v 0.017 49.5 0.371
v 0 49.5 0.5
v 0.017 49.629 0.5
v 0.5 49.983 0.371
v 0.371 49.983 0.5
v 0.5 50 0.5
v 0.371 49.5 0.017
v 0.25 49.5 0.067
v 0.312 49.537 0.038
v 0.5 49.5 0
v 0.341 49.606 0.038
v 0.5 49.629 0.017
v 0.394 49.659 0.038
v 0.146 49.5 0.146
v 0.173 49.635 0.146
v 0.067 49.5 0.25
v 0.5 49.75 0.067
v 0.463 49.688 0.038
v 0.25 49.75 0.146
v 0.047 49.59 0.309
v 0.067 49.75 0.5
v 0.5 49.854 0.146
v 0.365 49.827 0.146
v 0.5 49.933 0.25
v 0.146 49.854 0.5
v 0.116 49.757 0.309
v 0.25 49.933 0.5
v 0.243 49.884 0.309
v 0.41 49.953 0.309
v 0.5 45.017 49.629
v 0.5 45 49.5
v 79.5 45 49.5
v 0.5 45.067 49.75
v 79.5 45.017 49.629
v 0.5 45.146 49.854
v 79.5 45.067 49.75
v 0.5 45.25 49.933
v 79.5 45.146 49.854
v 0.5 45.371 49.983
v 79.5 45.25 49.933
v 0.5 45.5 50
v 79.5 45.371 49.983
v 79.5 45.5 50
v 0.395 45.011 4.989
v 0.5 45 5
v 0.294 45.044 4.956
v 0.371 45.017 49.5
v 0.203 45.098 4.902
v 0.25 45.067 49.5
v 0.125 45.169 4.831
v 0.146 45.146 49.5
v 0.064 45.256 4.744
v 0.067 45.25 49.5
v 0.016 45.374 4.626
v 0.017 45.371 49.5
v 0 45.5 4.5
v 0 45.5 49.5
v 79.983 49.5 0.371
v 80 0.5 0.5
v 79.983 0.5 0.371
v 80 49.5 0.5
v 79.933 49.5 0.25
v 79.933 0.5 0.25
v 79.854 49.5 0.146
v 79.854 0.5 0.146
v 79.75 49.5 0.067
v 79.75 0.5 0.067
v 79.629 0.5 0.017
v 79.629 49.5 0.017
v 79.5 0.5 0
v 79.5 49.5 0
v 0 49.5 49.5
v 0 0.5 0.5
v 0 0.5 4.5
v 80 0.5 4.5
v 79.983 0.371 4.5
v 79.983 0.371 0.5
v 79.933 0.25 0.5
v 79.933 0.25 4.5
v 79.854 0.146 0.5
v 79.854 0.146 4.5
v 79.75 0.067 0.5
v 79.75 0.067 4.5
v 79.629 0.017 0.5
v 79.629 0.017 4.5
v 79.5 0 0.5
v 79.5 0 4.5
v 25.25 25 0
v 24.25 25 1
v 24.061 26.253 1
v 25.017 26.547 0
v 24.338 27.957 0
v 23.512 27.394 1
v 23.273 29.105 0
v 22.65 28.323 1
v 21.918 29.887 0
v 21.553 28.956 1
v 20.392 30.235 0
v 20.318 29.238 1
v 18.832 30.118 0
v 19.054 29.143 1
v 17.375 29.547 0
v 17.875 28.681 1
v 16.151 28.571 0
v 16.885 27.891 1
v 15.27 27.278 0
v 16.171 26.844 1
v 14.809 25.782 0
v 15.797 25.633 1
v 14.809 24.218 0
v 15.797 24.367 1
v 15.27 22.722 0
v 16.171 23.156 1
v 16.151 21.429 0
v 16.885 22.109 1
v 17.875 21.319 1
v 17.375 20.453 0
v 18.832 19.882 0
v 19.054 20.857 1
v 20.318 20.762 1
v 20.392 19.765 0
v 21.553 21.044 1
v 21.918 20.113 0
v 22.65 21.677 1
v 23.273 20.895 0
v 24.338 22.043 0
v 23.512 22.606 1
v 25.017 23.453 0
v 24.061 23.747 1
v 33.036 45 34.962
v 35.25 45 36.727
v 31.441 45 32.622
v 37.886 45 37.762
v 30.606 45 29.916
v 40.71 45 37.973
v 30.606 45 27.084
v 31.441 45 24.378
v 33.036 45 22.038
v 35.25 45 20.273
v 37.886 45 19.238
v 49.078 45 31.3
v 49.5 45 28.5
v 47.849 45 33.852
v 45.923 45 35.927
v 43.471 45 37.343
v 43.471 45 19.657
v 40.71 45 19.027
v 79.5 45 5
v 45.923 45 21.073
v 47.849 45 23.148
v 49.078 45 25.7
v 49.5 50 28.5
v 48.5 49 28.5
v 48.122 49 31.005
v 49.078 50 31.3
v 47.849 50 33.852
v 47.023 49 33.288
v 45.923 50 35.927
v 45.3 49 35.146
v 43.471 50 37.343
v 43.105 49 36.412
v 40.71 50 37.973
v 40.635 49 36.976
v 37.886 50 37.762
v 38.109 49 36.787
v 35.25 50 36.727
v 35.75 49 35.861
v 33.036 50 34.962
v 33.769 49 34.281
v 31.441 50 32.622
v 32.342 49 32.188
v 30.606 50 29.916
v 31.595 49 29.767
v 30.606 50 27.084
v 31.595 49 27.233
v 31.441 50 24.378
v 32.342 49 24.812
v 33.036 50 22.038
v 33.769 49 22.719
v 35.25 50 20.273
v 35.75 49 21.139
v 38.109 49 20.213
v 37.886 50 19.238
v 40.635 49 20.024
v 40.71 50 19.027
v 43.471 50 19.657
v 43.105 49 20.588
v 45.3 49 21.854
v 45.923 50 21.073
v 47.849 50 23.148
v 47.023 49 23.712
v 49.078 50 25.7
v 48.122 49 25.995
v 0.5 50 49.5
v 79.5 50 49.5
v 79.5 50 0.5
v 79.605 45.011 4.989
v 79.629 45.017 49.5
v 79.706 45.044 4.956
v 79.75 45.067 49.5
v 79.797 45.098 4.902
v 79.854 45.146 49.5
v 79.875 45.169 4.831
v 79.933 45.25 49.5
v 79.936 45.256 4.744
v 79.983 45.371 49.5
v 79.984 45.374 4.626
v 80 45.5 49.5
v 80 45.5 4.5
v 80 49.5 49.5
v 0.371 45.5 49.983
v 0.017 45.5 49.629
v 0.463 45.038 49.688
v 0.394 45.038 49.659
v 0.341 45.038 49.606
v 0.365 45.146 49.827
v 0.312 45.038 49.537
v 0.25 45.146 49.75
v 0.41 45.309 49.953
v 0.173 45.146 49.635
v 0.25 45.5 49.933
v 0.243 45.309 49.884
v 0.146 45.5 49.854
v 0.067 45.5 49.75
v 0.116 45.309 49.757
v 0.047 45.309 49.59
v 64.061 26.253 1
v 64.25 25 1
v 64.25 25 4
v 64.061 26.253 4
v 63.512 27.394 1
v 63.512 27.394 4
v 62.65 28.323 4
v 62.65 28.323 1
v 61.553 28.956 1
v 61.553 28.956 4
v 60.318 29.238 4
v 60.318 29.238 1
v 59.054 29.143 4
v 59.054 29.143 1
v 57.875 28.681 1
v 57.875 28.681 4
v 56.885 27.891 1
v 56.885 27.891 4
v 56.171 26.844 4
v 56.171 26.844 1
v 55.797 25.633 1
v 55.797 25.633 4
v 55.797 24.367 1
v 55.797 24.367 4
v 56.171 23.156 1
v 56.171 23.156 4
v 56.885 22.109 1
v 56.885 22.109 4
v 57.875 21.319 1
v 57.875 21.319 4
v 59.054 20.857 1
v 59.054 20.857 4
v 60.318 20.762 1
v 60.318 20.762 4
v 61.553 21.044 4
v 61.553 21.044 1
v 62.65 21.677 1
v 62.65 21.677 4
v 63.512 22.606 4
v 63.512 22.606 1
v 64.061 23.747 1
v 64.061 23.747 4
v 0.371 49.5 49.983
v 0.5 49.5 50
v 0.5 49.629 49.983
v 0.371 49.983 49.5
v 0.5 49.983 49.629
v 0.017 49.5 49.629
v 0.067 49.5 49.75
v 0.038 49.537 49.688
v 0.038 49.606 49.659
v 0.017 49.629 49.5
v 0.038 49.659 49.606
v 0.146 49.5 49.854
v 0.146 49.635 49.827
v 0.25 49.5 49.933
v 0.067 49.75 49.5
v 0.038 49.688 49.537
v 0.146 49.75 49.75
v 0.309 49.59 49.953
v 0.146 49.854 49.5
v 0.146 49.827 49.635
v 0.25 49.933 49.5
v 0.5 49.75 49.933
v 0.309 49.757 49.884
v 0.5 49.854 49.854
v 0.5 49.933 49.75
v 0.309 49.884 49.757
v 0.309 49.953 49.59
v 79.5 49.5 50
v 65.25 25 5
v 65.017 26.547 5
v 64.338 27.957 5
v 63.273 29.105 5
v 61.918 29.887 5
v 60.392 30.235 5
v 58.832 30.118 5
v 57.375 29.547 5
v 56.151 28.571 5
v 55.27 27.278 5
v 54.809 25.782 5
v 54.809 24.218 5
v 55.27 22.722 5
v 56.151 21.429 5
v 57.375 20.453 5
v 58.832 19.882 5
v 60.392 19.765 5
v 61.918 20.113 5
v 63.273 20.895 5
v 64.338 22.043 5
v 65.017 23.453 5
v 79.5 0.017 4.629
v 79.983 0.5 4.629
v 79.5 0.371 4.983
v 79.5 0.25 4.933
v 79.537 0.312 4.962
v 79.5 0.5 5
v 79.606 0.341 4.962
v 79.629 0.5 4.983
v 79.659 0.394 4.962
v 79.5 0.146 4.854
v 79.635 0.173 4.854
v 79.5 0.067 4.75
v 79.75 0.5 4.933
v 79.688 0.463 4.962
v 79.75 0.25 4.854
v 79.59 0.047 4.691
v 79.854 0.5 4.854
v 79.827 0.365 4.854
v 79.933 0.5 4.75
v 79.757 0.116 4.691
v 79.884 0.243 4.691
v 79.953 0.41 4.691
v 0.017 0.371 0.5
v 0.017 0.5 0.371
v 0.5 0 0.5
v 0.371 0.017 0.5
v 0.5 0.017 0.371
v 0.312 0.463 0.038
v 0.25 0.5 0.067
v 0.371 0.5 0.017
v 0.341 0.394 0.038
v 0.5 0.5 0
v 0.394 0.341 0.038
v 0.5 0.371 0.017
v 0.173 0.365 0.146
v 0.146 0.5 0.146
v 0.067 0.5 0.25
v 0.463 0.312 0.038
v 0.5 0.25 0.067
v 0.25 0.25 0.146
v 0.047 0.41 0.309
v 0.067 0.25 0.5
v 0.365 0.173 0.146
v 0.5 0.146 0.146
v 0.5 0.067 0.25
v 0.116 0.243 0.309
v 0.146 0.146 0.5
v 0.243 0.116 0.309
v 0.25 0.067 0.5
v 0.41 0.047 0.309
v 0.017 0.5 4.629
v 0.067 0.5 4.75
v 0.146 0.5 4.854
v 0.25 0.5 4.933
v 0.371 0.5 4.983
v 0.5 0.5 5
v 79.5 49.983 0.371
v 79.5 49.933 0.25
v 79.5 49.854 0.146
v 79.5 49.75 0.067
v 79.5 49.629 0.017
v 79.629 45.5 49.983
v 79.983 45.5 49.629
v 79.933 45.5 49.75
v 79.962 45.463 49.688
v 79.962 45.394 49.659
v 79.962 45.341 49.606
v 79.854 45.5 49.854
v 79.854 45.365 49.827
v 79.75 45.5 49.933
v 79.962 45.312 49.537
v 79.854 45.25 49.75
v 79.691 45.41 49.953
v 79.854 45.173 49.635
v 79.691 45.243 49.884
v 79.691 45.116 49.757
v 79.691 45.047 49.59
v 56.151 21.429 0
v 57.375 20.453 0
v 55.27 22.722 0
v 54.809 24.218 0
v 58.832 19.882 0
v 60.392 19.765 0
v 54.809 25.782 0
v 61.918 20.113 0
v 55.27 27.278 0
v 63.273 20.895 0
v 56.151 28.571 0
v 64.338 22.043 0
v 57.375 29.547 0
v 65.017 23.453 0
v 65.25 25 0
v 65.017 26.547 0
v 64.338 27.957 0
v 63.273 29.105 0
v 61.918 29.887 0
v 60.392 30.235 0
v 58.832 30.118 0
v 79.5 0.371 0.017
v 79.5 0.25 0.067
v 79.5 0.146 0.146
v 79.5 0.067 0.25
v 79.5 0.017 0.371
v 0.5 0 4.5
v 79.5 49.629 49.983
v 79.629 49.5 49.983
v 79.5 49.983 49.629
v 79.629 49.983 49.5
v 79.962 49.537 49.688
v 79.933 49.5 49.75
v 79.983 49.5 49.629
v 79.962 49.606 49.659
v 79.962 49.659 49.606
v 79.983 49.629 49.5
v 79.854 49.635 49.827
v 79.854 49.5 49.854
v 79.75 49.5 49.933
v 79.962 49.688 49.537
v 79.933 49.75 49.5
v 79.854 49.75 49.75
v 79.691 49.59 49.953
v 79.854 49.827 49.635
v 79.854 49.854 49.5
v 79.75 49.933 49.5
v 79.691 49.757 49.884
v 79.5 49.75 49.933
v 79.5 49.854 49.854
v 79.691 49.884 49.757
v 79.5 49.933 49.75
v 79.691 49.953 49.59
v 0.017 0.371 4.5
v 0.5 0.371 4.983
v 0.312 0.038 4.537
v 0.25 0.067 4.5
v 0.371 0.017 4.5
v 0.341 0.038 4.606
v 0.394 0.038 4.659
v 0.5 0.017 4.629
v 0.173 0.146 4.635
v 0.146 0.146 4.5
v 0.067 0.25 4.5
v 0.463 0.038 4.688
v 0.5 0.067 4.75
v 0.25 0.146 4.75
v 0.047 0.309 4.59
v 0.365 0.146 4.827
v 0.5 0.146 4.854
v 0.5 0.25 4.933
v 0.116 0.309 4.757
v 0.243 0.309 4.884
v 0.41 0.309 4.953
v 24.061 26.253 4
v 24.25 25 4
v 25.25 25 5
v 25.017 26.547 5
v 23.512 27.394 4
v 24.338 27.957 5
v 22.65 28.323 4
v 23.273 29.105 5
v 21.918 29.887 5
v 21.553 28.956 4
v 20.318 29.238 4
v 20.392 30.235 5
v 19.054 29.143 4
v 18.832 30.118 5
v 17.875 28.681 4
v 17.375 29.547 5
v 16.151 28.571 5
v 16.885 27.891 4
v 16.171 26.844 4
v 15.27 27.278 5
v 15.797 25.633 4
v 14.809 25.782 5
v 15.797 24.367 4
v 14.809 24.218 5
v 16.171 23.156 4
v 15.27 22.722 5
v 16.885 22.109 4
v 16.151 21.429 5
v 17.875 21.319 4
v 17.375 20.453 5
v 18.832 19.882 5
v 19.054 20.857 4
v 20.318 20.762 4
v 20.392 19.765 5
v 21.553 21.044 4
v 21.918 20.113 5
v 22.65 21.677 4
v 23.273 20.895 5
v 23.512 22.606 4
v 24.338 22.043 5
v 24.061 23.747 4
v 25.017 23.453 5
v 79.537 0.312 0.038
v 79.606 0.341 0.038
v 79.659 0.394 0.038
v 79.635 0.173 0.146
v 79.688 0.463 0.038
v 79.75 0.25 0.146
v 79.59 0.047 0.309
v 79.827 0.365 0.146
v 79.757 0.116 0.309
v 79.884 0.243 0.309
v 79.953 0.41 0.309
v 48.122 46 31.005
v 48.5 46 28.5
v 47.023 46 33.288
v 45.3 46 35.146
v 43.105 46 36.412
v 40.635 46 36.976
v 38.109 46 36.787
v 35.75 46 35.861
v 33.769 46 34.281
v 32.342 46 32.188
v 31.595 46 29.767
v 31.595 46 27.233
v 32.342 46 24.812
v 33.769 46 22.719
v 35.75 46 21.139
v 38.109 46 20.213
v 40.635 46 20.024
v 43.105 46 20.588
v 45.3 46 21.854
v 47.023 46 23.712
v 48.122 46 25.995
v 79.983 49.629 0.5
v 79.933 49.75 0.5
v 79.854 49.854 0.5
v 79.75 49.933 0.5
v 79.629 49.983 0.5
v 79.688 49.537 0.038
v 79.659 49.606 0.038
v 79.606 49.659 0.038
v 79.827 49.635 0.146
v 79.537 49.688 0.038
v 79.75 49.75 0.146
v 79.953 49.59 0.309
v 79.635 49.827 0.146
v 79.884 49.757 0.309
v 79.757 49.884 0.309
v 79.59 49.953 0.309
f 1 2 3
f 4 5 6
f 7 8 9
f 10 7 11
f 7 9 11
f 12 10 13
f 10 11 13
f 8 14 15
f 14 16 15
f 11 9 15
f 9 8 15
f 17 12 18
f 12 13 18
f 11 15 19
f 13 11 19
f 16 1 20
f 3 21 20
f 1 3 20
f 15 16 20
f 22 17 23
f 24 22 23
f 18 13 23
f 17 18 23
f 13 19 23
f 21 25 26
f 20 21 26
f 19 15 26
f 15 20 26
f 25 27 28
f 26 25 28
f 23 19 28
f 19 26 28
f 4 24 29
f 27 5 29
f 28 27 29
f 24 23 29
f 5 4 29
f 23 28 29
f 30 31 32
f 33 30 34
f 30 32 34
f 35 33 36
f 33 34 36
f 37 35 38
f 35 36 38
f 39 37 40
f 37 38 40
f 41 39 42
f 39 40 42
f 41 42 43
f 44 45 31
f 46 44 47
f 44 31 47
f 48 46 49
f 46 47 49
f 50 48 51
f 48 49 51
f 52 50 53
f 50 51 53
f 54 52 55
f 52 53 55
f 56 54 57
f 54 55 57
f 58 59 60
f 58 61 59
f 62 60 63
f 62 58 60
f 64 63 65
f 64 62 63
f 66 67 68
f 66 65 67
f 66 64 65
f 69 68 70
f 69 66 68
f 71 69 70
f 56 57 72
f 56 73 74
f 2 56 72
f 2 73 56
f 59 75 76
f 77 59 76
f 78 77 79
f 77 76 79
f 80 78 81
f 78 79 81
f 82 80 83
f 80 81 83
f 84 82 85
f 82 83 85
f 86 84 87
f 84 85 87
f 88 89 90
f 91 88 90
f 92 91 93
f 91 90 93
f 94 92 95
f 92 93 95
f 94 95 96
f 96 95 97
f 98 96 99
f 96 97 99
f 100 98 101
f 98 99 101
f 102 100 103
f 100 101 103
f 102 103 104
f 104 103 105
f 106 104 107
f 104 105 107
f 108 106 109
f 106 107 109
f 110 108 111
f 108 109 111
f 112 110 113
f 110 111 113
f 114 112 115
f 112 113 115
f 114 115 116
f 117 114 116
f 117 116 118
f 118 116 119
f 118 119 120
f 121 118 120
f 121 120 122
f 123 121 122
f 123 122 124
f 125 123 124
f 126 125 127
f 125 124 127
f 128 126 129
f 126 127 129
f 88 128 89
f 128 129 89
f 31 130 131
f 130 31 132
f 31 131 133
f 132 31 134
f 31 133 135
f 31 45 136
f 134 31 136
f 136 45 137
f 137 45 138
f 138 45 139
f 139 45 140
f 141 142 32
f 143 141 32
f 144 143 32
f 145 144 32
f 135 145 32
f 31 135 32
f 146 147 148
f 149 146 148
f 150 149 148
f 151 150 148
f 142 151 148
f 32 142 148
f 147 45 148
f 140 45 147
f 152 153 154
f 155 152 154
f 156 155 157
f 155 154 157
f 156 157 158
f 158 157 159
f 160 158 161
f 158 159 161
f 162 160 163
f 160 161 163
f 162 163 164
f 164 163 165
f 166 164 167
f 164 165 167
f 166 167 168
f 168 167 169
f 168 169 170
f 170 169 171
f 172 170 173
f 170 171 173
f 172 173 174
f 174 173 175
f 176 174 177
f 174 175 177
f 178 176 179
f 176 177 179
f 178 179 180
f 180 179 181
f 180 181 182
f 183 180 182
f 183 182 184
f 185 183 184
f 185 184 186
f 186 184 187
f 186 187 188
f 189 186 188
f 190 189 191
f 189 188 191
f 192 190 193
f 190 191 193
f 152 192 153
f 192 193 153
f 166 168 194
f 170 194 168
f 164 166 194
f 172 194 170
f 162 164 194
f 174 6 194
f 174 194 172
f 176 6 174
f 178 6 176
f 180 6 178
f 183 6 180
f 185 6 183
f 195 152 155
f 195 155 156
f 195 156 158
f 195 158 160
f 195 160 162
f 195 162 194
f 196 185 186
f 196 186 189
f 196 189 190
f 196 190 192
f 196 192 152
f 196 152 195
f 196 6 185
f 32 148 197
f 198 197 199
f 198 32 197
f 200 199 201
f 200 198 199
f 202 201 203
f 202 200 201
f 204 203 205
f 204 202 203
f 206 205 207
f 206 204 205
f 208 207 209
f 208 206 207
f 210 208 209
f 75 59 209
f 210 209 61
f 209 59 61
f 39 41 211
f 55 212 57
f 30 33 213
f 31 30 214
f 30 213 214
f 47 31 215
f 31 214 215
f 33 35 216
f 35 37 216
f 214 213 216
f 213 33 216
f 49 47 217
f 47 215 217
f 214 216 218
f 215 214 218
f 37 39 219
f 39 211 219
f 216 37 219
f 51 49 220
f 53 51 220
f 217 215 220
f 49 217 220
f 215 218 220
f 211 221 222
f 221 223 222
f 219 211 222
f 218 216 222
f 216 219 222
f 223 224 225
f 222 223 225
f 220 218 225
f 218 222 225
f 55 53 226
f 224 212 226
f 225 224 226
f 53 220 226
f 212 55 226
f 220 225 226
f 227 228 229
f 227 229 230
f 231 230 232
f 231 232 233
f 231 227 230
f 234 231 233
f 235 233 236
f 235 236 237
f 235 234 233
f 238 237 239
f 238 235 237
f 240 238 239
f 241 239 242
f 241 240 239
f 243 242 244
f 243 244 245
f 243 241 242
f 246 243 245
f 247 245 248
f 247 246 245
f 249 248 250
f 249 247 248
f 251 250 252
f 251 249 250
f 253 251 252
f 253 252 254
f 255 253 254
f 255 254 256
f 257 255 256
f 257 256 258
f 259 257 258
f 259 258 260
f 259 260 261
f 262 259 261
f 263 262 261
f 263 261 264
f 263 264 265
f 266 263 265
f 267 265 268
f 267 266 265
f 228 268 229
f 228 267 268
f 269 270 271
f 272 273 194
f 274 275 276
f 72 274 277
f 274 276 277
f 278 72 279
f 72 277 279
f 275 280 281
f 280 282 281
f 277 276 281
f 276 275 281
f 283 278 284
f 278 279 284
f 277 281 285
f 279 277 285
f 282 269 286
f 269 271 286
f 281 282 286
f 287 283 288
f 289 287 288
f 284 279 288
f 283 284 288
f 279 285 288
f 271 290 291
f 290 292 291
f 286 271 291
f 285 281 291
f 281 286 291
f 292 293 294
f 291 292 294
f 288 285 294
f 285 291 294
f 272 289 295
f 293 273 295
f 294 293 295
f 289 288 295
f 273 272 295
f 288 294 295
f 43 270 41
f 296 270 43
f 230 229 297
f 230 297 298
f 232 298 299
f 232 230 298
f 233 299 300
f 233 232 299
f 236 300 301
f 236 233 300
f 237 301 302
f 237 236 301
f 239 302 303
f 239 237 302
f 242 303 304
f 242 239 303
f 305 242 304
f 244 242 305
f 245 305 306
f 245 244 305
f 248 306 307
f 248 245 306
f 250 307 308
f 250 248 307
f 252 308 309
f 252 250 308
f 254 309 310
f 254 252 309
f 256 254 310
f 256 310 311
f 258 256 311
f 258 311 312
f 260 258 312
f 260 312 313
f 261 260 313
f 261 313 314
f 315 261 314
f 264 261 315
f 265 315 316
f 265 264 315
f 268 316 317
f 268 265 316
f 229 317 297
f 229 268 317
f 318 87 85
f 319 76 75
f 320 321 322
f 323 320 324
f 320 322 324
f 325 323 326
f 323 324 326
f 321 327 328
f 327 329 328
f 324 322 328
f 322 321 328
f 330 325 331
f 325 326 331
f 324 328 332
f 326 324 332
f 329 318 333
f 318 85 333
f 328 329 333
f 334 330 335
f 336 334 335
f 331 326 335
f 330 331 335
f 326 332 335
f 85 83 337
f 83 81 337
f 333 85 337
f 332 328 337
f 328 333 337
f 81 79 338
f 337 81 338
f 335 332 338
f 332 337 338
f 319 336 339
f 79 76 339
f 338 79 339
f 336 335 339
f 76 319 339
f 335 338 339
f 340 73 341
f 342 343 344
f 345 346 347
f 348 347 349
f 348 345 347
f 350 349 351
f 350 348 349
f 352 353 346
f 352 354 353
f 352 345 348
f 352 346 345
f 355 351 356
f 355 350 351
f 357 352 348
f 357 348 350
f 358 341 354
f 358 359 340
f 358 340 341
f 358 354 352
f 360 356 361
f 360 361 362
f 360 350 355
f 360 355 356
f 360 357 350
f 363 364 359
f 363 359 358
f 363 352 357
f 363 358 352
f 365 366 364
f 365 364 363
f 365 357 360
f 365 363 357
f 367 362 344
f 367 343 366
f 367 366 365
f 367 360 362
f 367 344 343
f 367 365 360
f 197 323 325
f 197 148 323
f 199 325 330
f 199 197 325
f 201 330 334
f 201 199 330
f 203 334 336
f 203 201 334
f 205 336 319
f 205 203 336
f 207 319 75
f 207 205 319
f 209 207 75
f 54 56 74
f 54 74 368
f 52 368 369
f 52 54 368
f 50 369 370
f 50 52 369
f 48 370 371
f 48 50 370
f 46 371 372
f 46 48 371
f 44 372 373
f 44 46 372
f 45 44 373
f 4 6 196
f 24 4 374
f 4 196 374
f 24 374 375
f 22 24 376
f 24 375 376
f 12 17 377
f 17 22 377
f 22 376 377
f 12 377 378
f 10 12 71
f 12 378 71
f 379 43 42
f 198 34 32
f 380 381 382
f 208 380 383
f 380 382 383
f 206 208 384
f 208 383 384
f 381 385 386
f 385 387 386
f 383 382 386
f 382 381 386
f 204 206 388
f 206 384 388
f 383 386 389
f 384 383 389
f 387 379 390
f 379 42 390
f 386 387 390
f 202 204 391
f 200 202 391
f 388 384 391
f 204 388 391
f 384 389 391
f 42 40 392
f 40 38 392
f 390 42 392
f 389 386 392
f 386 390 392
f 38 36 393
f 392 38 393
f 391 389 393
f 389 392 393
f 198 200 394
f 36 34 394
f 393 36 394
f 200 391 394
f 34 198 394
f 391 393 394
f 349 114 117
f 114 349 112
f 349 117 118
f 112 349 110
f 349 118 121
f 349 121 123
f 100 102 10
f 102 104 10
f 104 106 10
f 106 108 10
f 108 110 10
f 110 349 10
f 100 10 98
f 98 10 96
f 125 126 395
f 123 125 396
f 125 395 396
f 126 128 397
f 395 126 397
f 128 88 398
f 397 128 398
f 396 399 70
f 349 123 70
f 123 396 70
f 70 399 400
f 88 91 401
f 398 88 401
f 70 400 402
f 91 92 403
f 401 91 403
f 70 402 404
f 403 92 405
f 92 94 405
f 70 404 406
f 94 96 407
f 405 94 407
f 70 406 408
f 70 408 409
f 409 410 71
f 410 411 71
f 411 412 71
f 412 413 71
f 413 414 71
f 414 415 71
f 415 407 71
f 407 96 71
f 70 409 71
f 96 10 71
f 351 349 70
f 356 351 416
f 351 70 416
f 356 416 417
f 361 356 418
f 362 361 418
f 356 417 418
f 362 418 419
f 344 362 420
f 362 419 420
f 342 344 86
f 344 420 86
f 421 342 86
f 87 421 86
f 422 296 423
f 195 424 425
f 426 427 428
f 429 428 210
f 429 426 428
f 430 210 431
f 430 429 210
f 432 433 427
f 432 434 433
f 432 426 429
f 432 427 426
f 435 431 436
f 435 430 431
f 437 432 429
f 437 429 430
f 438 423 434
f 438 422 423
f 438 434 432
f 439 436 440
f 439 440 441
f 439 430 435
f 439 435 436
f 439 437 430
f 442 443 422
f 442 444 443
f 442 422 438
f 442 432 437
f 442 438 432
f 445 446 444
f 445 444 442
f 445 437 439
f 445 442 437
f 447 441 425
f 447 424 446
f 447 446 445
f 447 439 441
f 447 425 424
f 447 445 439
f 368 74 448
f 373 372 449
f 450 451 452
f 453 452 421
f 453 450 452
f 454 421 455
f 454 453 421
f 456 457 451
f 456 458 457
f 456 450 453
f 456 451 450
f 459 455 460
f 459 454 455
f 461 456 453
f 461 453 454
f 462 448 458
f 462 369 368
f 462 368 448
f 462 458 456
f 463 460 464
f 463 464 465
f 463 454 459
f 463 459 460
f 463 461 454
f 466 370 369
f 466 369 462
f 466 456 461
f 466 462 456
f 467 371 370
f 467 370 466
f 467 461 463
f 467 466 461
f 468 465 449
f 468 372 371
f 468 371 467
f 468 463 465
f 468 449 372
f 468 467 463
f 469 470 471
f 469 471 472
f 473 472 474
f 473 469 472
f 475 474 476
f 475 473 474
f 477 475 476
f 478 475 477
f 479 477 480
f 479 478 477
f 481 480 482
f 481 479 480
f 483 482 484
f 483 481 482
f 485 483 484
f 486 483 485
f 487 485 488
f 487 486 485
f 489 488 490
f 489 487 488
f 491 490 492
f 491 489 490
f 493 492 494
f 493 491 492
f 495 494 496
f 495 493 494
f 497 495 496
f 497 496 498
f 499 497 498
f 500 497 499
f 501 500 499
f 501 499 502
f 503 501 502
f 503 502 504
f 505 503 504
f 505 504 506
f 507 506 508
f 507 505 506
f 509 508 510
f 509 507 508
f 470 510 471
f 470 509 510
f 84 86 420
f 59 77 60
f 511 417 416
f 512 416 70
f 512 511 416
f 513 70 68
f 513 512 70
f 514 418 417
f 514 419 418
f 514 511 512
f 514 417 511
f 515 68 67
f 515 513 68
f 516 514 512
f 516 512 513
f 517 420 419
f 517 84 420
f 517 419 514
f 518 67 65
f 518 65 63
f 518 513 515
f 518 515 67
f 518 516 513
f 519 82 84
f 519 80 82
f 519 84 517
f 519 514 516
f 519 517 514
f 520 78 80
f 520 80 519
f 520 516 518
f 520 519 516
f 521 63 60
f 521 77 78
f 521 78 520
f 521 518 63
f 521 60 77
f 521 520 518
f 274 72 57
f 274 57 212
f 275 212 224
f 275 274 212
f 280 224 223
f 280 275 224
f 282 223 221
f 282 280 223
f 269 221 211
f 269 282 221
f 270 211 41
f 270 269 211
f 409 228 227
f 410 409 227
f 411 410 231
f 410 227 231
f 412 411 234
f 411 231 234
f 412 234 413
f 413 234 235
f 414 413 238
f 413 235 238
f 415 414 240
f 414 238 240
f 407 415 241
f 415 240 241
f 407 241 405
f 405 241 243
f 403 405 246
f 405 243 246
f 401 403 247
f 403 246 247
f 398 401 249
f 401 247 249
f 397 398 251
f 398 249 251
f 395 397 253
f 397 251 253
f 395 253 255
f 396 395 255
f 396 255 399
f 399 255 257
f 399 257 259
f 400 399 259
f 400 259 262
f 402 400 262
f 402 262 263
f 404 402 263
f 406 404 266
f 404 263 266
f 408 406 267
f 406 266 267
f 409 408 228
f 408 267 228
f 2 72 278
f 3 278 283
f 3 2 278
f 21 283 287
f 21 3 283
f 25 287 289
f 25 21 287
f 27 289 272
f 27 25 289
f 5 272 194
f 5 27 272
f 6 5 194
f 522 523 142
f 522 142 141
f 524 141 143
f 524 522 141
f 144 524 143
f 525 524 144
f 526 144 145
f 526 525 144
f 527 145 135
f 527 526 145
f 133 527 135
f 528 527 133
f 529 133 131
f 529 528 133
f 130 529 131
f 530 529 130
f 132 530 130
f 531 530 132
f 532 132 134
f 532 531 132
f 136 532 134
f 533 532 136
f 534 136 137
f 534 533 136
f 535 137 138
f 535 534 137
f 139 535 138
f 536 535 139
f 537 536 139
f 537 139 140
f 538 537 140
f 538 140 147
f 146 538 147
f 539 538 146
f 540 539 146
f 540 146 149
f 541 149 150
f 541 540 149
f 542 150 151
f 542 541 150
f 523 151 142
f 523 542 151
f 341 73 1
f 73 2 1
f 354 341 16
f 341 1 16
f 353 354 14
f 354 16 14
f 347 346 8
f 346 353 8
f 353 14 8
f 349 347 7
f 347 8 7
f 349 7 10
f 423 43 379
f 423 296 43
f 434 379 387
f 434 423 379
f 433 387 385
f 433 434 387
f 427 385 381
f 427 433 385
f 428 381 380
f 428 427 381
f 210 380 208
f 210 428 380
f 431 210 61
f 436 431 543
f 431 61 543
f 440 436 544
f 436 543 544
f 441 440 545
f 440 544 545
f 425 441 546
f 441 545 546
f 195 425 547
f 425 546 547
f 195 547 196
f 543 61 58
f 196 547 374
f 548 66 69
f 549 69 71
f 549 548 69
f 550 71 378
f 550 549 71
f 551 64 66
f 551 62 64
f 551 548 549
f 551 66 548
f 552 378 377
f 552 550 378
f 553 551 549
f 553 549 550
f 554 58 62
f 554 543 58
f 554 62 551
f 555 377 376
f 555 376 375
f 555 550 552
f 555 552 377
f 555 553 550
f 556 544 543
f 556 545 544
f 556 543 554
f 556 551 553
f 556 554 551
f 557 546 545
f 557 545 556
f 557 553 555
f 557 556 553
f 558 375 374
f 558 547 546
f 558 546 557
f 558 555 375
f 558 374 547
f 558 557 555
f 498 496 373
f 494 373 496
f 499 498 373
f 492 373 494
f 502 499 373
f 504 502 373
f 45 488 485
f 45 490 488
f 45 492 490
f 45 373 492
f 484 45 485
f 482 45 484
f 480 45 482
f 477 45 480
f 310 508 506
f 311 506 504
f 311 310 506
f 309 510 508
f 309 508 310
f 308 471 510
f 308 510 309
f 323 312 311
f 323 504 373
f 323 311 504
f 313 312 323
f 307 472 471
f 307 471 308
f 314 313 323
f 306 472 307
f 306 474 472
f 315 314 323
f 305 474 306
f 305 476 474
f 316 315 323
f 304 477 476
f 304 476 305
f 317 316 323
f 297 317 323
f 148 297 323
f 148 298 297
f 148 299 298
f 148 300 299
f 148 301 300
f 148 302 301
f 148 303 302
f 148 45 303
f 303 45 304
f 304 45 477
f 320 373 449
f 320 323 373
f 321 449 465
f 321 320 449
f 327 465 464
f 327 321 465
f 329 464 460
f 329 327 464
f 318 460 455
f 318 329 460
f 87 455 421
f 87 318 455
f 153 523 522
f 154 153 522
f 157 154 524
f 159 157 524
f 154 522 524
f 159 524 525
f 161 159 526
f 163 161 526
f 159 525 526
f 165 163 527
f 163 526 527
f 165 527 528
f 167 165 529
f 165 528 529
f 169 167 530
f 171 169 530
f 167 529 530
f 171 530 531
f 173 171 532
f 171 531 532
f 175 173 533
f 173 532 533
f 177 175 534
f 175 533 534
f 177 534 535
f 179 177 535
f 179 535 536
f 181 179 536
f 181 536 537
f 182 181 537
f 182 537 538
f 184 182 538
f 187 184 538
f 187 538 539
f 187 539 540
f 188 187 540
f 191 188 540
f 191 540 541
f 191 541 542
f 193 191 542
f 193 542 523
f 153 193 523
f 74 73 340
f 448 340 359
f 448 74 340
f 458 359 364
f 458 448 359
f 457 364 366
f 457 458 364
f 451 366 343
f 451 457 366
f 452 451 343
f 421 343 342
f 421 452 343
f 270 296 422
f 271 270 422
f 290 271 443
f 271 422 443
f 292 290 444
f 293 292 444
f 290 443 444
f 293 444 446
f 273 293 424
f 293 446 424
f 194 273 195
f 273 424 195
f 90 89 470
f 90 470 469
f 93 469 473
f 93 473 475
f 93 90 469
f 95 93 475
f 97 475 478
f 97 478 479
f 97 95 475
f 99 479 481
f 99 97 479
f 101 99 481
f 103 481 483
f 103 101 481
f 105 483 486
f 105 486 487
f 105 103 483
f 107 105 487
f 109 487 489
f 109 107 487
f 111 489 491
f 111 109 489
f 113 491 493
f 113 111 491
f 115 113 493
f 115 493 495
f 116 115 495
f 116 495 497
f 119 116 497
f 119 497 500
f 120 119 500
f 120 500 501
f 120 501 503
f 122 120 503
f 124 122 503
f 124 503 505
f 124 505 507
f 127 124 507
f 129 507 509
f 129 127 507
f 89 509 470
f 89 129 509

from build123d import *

# Parameters (mm, degrees)
F0_W     = 80
F0_H     = 50
F0_R     = 4.25
F1_DEPTH = 5
F2_W     = 80
F2_H     = 5
F3_DEPTH = 45
F4_R     = 8.5
F5_DEPTH = 25
F6_SIZE  = 1
F7_R     = 0.5


with BuildPart() as f1:
    # F0 (on Top) → F1 (new body)
    with BuildSketch(Plane.XY):
        with Locations((40, 25)):
            Rectangle(F0_W, F0_H)
        with Locations((20, 25)):
            Circle(F0_R, mode=Mode.SUBTRACT)
        with Locations((60, 25)):
            Circle(F0_R, mode=Mode.SUBTRACT)
    extrude(amount=F1_DEPTH)

    # F2 (on face) → F3 (join)
    with BuildSketch(Plane.XY.offset(5)):
        with Locations((40, 47.5)):
            Rectangle(F2_W, F2_H)
    extrude(amount=F3_DEPTH)

    # F4 (on face) → F5 (cut)
    with BuildSketch(Plane.XZ.offset(-45)):
        with Locations((40, 28.5)):
            Circle(F4_R)
    extrude(amount=-F5_DEPTH, mode=Mode.SUBTRACT)

    # F6
    f6_edges = [f1.edges().sort_by_distance(p)[0] for p in [
        (31.5, 45, 28.5),
        (31.5, 50, 28.5),
        (15.75, 25, 5),
        (55.75, 25, 5),
        (55.75, 25, 0),
        (15.75, 25, 0),
    ]]
    chamfer(f6_edges, length=F6_SIZE)

    # F7
    f7_edges = [f1.edges().sort_by_distance(p)[0] for p in [
        (40, 50, 50),
        (0, 47.5, 50),
        (40, 45, 50),
        (80, 47.5, 50),
        (0, 50, 25),
        (0, 45, 27.5),
        (0, 22.5, 5),
        (0, 0, 2.5),
        (0, 25, 0),
        (80, 0, 2.5),
        (40, 0, 0),
        (40, 0, 5),
        (80, 22.5, 5),
        (80, 45, 27.5),
        (80, 50, 25),
        (80, 25, 0),
        (40, 50, 0),
    ]]
    fillet(f7_edges, radius=F7_R)


solid = f1.part
